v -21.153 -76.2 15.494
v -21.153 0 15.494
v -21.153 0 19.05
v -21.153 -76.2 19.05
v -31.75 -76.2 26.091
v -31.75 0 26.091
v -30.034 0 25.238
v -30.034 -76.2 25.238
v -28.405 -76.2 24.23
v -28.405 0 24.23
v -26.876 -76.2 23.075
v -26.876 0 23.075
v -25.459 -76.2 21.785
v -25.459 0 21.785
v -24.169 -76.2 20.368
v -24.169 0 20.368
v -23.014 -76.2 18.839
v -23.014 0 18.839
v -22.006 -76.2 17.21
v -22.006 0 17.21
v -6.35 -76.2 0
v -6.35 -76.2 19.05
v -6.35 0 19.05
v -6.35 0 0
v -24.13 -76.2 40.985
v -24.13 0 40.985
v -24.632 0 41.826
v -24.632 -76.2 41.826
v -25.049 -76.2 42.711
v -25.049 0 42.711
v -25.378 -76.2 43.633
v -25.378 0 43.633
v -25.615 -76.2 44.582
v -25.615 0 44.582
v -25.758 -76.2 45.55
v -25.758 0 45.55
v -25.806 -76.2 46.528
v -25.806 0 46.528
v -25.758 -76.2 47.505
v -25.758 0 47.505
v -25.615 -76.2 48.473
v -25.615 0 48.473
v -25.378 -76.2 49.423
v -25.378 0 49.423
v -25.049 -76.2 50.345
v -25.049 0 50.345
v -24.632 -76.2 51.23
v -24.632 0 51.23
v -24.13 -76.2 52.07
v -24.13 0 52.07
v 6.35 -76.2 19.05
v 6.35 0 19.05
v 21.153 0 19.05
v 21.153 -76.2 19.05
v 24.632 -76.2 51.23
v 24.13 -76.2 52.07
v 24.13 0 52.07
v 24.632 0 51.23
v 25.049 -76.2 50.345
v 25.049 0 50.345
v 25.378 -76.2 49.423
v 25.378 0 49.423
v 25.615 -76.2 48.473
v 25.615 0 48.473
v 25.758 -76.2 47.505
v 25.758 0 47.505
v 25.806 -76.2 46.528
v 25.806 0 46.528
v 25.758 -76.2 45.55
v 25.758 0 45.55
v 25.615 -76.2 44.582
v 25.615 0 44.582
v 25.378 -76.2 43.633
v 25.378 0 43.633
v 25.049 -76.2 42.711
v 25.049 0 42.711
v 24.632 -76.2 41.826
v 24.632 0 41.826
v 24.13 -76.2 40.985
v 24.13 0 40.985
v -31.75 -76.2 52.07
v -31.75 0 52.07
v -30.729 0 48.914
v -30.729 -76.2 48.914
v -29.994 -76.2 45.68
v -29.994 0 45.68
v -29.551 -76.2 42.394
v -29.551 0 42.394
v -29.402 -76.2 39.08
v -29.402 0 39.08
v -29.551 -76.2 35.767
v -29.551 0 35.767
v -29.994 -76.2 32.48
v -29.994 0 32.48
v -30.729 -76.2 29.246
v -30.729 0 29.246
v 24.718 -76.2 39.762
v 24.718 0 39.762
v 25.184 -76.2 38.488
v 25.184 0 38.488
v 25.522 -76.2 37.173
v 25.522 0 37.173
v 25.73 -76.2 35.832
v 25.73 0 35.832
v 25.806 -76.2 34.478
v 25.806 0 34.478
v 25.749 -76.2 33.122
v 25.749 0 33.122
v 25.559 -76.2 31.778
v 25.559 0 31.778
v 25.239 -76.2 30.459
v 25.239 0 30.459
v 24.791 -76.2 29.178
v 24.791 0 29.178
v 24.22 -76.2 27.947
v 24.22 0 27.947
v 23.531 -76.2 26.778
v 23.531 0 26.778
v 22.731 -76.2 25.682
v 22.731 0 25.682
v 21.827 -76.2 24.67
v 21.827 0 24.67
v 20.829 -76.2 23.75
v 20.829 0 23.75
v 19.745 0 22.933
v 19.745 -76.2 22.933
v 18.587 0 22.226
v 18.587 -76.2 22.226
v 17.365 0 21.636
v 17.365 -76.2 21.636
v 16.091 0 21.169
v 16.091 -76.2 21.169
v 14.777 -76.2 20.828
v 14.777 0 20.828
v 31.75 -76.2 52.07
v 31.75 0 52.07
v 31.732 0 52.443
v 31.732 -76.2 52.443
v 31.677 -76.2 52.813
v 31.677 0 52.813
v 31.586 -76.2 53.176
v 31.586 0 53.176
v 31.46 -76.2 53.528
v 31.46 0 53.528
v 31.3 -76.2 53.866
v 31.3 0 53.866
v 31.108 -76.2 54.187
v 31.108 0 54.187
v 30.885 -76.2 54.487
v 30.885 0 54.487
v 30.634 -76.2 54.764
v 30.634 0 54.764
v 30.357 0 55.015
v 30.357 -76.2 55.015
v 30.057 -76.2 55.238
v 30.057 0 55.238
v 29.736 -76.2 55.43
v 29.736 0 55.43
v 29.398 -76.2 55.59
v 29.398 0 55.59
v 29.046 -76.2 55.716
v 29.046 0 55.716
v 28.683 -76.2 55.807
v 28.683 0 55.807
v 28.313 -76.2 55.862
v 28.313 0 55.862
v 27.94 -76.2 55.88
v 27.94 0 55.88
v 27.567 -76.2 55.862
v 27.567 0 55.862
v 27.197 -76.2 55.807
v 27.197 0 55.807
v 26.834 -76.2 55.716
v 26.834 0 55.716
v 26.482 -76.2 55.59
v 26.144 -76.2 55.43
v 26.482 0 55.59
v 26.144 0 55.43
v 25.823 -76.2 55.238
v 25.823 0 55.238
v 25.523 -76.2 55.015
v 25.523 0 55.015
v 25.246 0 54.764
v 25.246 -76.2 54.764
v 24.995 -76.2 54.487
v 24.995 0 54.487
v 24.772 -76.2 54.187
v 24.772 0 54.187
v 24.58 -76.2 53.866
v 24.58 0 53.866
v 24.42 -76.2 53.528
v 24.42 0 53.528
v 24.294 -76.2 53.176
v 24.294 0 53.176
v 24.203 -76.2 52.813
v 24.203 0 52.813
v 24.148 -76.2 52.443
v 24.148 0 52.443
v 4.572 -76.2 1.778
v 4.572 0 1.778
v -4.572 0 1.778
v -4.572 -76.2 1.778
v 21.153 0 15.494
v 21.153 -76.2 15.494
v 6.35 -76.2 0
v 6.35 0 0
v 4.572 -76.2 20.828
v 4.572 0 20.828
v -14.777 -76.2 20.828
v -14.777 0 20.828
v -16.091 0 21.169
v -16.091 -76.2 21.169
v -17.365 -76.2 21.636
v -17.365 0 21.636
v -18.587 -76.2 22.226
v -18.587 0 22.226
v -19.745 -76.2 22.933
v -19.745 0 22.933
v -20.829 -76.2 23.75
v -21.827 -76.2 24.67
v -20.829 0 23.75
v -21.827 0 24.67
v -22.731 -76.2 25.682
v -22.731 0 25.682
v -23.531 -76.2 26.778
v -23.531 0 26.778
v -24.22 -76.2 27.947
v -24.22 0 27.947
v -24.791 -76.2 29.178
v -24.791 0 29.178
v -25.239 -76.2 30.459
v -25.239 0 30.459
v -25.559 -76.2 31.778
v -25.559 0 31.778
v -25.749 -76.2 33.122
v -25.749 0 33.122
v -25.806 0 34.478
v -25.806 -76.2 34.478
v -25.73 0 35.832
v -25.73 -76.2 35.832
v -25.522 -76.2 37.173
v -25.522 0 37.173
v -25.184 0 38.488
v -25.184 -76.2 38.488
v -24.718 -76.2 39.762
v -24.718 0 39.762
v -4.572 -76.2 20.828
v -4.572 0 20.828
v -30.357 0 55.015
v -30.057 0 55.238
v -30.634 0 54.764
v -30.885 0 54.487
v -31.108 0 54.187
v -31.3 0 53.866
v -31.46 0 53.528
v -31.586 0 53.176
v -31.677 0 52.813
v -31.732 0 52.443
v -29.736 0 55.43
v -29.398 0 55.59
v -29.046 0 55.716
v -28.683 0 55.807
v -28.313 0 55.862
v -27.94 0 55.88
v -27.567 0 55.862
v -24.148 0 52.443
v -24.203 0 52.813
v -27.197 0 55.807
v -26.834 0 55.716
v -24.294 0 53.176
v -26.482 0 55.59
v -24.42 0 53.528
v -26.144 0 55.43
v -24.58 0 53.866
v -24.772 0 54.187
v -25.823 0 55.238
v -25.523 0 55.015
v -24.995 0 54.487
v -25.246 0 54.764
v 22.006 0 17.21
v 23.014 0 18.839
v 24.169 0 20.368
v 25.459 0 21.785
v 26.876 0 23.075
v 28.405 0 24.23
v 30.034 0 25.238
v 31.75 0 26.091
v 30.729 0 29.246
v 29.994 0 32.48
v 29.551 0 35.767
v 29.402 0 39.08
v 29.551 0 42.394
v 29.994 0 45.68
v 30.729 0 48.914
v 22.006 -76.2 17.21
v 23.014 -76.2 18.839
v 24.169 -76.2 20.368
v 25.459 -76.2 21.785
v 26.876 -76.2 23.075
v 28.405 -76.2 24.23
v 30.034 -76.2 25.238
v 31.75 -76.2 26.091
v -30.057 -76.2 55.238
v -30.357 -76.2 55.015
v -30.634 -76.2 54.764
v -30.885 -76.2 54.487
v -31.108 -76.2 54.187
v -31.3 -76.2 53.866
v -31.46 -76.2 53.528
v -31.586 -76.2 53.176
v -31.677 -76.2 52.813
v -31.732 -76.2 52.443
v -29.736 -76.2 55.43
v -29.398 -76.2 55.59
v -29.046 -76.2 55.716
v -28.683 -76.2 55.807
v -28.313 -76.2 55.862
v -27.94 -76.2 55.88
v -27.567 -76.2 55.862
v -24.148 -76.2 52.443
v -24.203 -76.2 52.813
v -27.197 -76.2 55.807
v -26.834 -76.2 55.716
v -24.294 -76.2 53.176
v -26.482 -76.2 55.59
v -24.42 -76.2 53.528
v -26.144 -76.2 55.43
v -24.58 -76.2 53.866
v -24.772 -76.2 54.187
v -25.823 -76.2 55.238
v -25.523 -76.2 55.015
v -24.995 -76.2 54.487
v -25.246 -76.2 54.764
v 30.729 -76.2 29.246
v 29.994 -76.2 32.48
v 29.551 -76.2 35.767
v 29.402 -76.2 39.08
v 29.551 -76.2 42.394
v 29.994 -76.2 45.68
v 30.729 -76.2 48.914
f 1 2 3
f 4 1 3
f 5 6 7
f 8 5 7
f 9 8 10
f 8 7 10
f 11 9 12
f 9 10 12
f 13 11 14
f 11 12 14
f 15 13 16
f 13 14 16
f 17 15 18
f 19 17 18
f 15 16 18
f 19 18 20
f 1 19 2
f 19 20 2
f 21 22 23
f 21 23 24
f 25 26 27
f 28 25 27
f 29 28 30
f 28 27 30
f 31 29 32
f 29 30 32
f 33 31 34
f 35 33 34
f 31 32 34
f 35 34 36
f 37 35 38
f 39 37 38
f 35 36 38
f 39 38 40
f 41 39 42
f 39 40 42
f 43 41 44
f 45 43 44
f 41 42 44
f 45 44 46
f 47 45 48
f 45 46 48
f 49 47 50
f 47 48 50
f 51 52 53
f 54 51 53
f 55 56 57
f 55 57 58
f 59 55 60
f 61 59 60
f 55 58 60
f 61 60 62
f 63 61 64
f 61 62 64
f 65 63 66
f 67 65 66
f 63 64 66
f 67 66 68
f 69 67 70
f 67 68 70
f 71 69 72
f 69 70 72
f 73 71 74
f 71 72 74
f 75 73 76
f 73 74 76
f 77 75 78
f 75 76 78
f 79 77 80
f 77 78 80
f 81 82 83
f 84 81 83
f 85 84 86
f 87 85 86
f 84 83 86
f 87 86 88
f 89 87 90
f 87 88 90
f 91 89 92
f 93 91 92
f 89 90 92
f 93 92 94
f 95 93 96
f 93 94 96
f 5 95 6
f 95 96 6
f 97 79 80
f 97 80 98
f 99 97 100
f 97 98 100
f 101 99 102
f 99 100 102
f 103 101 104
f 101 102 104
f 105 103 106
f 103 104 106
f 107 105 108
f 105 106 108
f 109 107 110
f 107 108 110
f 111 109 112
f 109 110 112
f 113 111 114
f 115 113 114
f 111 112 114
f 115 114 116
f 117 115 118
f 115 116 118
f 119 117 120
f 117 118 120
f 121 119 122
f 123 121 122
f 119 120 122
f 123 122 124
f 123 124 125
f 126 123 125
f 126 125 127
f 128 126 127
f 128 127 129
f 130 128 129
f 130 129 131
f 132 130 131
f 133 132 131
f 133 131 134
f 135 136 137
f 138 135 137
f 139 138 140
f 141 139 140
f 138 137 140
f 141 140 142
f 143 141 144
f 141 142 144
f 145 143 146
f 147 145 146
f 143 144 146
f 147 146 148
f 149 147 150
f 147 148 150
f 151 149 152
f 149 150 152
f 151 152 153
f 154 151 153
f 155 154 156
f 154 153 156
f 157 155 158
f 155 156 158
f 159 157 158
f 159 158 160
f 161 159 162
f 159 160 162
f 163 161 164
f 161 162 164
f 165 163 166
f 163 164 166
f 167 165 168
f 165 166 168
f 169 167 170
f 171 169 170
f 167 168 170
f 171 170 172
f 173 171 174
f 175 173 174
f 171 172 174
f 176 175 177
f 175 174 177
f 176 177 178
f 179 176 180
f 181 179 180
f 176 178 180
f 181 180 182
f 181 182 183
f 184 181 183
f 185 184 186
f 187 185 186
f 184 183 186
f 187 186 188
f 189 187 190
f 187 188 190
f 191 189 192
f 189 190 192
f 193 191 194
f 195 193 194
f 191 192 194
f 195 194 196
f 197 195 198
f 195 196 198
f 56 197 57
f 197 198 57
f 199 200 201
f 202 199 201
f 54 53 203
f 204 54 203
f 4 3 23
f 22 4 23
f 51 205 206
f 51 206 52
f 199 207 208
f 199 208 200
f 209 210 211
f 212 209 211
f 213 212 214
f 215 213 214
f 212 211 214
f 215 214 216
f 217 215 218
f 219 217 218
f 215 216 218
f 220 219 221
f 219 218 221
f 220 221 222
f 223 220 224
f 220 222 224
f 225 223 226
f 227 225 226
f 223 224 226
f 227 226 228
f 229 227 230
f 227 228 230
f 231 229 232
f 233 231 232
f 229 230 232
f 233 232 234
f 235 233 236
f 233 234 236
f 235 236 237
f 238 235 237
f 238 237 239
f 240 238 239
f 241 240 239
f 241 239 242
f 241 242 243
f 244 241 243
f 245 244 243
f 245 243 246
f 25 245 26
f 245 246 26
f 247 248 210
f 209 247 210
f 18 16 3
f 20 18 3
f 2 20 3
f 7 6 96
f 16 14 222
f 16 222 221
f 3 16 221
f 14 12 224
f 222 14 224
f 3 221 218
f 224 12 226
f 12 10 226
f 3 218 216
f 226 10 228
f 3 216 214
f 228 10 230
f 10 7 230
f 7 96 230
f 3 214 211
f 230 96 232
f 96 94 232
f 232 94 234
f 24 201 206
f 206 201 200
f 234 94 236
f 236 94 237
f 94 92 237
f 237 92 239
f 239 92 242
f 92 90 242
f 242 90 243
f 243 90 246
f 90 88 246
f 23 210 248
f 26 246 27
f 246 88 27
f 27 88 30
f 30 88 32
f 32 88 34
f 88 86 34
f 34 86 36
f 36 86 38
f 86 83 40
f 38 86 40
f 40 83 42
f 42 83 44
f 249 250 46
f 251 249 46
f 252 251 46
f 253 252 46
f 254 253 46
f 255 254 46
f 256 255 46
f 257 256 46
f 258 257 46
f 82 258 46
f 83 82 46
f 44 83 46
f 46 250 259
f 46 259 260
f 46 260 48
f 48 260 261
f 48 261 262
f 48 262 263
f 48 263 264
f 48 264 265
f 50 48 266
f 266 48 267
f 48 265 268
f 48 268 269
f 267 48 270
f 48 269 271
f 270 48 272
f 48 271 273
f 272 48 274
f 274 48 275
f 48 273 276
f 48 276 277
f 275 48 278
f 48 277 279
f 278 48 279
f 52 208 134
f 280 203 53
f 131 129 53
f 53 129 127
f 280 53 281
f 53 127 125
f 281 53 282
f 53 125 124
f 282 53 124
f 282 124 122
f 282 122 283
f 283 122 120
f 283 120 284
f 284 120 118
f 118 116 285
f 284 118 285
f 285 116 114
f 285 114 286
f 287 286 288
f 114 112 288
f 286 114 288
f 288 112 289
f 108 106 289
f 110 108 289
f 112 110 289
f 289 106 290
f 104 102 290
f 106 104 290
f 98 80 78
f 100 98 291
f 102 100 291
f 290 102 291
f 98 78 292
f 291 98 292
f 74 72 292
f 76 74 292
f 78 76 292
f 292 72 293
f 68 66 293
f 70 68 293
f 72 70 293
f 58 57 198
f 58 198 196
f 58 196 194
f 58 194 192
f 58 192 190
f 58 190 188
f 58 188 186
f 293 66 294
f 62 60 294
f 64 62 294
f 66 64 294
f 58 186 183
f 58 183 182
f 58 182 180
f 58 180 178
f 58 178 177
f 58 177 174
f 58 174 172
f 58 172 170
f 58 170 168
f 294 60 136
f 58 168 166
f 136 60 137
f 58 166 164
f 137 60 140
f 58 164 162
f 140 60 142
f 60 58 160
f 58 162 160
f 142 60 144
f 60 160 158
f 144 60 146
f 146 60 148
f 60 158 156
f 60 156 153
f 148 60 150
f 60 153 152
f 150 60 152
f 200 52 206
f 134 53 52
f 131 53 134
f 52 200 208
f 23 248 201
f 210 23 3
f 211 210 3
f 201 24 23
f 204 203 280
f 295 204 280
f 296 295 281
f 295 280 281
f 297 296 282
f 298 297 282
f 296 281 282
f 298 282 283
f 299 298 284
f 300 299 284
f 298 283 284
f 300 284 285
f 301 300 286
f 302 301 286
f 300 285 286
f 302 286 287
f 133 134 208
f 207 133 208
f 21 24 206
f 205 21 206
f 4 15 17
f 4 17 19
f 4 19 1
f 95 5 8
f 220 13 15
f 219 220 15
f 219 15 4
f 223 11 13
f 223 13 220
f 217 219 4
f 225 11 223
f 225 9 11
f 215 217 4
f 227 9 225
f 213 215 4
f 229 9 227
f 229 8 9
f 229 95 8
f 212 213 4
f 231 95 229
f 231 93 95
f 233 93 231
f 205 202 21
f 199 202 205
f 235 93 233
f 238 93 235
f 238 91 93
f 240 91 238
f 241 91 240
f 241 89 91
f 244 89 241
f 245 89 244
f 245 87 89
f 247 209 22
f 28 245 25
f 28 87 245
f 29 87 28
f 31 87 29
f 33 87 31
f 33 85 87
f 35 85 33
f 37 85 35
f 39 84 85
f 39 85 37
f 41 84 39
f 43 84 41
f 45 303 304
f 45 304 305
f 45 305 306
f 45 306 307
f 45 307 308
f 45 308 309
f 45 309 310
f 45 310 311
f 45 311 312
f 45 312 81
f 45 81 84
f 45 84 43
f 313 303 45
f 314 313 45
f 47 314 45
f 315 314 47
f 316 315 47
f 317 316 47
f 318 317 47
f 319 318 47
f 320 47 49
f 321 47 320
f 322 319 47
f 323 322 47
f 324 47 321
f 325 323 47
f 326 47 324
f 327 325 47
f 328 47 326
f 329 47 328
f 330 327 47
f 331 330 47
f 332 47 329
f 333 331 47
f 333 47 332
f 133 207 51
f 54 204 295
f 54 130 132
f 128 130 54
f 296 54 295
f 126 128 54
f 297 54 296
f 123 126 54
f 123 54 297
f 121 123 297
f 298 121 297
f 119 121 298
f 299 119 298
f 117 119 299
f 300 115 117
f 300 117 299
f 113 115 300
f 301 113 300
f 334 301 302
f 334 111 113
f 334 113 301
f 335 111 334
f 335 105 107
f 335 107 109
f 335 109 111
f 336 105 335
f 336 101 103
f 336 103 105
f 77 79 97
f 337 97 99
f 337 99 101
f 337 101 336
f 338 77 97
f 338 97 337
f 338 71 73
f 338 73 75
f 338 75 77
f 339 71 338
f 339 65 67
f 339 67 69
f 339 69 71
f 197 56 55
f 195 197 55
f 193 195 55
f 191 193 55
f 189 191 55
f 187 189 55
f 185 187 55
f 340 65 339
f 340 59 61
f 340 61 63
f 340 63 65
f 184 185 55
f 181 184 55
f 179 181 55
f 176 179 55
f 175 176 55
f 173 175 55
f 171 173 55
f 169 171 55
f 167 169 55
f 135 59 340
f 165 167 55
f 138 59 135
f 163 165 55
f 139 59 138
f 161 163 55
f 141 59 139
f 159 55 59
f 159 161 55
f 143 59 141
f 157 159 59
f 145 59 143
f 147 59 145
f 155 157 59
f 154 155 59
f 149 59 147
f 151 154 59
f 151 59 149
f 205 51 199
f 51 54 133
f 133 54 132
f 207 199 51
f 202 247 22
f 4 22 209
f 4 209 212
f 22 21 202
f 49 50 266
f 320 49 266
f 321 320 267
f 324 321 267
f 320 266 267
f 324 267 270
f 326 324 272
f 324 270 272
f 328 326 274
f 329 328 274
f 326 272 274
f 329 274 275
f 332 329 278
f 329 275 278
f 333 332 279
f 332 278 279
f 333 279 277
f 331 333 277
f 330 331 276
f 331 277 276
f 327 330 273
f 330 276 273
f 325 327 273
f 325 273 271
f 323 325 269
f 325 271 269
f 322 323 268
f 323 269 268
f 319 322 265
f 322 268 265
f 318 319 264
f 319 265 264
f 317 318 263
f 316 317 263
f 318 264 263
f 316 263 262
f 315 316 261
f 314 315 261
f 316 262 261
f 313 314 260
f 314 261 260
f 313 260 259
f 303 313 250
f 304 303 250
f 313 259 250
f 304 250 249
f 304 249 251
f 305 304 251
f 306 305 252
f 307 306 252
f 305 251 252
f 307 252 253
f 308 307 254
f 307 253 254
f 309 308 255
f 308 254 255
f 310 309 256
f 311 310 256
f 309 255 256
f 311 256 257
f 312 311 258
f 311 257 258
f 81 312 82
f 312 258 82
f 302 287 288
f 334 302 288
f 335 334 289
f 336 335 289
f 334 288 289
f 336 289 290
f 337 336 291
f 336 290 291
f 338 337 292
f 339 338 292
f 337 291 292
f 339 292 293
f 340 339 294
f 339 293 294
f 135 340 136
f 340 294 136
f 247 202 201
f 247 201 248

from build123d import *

# Parameters (mm, degrees)
F1_DEPTH = 76.2


with BuildPart() as f1:
    # F0 (on Front) → F1 (new body)
    with BuildSketch(Plane.XZ):
        with BuildLine():
            Line((-6.35, 0), (0, 0))
            Line((0, 0), (6.35, 0))
            Line((6.35, 0), (6.35, 19.05))
            Line((6.35, 19.05), (21.153298, 19.05))
            Line((21.153298, 19.05), (21.153298, 15.494))
            ThreePointArc((21.153298, 15.494), (25.459427, 21.784573), (31.75, 26.090702))
            ThreePointArc((31.75, 26.090702), (29.40245, 39.080351), (31.75, 52.07))
            ThreePointArc((31.75, 52.07), (27.94, 55.88), (24.13, 52.07))
            ThreePointArc((24.13, 52.07), (25.806343, 46.527676), (24.13, 40.985351))
            ThreePointArc((24.13, 40.985351), (24.520495, 28.555752), (14.77733, 20.828))
            Line((14.77733, 20.828), (4.572, 20.828))
            Line((4.572, 20.828), (4.572, 1.778))
            Line((4.572, 1.778), (0, 1.778))
            Line((0, 1.778), (-4.572, 1.778))
            Line((-4.572, 1.778), (-4.572, 20.828))
            Line((-4.572, 20.828), (-14.77733, 20.828))
            ThreePointArc((-14.77733, 20.828), (-24.520495, 28.555752), (-24.13, 40.985351))
            ThreePointArc((-24.13, 40.985351), (-25.806343, 46.527676), (-24.13, 52.07))
            ThreePointArc((-24.13, 52.07), (-27.94, 55.88), (-31.75, 52.07))
            ThreePointArc((-31.75, 52.07), (-29.40245, 39.080351), (-31.75, 26.090702))
            ThreePointArc((-31.75, 26.090702), (-25.459427, 21.784573), (-21.153298, 15.494))
            Line((-21.153298, 15.494), (-21.153298, 19.05))
            Line((-21.153298, 19.05), (-6.35, 19.05))
            Line((-6.35, 19.05), (-6.35, 0))
        make_face()
    extrude(amount=F1_DEPTH)


solid = f1.part
